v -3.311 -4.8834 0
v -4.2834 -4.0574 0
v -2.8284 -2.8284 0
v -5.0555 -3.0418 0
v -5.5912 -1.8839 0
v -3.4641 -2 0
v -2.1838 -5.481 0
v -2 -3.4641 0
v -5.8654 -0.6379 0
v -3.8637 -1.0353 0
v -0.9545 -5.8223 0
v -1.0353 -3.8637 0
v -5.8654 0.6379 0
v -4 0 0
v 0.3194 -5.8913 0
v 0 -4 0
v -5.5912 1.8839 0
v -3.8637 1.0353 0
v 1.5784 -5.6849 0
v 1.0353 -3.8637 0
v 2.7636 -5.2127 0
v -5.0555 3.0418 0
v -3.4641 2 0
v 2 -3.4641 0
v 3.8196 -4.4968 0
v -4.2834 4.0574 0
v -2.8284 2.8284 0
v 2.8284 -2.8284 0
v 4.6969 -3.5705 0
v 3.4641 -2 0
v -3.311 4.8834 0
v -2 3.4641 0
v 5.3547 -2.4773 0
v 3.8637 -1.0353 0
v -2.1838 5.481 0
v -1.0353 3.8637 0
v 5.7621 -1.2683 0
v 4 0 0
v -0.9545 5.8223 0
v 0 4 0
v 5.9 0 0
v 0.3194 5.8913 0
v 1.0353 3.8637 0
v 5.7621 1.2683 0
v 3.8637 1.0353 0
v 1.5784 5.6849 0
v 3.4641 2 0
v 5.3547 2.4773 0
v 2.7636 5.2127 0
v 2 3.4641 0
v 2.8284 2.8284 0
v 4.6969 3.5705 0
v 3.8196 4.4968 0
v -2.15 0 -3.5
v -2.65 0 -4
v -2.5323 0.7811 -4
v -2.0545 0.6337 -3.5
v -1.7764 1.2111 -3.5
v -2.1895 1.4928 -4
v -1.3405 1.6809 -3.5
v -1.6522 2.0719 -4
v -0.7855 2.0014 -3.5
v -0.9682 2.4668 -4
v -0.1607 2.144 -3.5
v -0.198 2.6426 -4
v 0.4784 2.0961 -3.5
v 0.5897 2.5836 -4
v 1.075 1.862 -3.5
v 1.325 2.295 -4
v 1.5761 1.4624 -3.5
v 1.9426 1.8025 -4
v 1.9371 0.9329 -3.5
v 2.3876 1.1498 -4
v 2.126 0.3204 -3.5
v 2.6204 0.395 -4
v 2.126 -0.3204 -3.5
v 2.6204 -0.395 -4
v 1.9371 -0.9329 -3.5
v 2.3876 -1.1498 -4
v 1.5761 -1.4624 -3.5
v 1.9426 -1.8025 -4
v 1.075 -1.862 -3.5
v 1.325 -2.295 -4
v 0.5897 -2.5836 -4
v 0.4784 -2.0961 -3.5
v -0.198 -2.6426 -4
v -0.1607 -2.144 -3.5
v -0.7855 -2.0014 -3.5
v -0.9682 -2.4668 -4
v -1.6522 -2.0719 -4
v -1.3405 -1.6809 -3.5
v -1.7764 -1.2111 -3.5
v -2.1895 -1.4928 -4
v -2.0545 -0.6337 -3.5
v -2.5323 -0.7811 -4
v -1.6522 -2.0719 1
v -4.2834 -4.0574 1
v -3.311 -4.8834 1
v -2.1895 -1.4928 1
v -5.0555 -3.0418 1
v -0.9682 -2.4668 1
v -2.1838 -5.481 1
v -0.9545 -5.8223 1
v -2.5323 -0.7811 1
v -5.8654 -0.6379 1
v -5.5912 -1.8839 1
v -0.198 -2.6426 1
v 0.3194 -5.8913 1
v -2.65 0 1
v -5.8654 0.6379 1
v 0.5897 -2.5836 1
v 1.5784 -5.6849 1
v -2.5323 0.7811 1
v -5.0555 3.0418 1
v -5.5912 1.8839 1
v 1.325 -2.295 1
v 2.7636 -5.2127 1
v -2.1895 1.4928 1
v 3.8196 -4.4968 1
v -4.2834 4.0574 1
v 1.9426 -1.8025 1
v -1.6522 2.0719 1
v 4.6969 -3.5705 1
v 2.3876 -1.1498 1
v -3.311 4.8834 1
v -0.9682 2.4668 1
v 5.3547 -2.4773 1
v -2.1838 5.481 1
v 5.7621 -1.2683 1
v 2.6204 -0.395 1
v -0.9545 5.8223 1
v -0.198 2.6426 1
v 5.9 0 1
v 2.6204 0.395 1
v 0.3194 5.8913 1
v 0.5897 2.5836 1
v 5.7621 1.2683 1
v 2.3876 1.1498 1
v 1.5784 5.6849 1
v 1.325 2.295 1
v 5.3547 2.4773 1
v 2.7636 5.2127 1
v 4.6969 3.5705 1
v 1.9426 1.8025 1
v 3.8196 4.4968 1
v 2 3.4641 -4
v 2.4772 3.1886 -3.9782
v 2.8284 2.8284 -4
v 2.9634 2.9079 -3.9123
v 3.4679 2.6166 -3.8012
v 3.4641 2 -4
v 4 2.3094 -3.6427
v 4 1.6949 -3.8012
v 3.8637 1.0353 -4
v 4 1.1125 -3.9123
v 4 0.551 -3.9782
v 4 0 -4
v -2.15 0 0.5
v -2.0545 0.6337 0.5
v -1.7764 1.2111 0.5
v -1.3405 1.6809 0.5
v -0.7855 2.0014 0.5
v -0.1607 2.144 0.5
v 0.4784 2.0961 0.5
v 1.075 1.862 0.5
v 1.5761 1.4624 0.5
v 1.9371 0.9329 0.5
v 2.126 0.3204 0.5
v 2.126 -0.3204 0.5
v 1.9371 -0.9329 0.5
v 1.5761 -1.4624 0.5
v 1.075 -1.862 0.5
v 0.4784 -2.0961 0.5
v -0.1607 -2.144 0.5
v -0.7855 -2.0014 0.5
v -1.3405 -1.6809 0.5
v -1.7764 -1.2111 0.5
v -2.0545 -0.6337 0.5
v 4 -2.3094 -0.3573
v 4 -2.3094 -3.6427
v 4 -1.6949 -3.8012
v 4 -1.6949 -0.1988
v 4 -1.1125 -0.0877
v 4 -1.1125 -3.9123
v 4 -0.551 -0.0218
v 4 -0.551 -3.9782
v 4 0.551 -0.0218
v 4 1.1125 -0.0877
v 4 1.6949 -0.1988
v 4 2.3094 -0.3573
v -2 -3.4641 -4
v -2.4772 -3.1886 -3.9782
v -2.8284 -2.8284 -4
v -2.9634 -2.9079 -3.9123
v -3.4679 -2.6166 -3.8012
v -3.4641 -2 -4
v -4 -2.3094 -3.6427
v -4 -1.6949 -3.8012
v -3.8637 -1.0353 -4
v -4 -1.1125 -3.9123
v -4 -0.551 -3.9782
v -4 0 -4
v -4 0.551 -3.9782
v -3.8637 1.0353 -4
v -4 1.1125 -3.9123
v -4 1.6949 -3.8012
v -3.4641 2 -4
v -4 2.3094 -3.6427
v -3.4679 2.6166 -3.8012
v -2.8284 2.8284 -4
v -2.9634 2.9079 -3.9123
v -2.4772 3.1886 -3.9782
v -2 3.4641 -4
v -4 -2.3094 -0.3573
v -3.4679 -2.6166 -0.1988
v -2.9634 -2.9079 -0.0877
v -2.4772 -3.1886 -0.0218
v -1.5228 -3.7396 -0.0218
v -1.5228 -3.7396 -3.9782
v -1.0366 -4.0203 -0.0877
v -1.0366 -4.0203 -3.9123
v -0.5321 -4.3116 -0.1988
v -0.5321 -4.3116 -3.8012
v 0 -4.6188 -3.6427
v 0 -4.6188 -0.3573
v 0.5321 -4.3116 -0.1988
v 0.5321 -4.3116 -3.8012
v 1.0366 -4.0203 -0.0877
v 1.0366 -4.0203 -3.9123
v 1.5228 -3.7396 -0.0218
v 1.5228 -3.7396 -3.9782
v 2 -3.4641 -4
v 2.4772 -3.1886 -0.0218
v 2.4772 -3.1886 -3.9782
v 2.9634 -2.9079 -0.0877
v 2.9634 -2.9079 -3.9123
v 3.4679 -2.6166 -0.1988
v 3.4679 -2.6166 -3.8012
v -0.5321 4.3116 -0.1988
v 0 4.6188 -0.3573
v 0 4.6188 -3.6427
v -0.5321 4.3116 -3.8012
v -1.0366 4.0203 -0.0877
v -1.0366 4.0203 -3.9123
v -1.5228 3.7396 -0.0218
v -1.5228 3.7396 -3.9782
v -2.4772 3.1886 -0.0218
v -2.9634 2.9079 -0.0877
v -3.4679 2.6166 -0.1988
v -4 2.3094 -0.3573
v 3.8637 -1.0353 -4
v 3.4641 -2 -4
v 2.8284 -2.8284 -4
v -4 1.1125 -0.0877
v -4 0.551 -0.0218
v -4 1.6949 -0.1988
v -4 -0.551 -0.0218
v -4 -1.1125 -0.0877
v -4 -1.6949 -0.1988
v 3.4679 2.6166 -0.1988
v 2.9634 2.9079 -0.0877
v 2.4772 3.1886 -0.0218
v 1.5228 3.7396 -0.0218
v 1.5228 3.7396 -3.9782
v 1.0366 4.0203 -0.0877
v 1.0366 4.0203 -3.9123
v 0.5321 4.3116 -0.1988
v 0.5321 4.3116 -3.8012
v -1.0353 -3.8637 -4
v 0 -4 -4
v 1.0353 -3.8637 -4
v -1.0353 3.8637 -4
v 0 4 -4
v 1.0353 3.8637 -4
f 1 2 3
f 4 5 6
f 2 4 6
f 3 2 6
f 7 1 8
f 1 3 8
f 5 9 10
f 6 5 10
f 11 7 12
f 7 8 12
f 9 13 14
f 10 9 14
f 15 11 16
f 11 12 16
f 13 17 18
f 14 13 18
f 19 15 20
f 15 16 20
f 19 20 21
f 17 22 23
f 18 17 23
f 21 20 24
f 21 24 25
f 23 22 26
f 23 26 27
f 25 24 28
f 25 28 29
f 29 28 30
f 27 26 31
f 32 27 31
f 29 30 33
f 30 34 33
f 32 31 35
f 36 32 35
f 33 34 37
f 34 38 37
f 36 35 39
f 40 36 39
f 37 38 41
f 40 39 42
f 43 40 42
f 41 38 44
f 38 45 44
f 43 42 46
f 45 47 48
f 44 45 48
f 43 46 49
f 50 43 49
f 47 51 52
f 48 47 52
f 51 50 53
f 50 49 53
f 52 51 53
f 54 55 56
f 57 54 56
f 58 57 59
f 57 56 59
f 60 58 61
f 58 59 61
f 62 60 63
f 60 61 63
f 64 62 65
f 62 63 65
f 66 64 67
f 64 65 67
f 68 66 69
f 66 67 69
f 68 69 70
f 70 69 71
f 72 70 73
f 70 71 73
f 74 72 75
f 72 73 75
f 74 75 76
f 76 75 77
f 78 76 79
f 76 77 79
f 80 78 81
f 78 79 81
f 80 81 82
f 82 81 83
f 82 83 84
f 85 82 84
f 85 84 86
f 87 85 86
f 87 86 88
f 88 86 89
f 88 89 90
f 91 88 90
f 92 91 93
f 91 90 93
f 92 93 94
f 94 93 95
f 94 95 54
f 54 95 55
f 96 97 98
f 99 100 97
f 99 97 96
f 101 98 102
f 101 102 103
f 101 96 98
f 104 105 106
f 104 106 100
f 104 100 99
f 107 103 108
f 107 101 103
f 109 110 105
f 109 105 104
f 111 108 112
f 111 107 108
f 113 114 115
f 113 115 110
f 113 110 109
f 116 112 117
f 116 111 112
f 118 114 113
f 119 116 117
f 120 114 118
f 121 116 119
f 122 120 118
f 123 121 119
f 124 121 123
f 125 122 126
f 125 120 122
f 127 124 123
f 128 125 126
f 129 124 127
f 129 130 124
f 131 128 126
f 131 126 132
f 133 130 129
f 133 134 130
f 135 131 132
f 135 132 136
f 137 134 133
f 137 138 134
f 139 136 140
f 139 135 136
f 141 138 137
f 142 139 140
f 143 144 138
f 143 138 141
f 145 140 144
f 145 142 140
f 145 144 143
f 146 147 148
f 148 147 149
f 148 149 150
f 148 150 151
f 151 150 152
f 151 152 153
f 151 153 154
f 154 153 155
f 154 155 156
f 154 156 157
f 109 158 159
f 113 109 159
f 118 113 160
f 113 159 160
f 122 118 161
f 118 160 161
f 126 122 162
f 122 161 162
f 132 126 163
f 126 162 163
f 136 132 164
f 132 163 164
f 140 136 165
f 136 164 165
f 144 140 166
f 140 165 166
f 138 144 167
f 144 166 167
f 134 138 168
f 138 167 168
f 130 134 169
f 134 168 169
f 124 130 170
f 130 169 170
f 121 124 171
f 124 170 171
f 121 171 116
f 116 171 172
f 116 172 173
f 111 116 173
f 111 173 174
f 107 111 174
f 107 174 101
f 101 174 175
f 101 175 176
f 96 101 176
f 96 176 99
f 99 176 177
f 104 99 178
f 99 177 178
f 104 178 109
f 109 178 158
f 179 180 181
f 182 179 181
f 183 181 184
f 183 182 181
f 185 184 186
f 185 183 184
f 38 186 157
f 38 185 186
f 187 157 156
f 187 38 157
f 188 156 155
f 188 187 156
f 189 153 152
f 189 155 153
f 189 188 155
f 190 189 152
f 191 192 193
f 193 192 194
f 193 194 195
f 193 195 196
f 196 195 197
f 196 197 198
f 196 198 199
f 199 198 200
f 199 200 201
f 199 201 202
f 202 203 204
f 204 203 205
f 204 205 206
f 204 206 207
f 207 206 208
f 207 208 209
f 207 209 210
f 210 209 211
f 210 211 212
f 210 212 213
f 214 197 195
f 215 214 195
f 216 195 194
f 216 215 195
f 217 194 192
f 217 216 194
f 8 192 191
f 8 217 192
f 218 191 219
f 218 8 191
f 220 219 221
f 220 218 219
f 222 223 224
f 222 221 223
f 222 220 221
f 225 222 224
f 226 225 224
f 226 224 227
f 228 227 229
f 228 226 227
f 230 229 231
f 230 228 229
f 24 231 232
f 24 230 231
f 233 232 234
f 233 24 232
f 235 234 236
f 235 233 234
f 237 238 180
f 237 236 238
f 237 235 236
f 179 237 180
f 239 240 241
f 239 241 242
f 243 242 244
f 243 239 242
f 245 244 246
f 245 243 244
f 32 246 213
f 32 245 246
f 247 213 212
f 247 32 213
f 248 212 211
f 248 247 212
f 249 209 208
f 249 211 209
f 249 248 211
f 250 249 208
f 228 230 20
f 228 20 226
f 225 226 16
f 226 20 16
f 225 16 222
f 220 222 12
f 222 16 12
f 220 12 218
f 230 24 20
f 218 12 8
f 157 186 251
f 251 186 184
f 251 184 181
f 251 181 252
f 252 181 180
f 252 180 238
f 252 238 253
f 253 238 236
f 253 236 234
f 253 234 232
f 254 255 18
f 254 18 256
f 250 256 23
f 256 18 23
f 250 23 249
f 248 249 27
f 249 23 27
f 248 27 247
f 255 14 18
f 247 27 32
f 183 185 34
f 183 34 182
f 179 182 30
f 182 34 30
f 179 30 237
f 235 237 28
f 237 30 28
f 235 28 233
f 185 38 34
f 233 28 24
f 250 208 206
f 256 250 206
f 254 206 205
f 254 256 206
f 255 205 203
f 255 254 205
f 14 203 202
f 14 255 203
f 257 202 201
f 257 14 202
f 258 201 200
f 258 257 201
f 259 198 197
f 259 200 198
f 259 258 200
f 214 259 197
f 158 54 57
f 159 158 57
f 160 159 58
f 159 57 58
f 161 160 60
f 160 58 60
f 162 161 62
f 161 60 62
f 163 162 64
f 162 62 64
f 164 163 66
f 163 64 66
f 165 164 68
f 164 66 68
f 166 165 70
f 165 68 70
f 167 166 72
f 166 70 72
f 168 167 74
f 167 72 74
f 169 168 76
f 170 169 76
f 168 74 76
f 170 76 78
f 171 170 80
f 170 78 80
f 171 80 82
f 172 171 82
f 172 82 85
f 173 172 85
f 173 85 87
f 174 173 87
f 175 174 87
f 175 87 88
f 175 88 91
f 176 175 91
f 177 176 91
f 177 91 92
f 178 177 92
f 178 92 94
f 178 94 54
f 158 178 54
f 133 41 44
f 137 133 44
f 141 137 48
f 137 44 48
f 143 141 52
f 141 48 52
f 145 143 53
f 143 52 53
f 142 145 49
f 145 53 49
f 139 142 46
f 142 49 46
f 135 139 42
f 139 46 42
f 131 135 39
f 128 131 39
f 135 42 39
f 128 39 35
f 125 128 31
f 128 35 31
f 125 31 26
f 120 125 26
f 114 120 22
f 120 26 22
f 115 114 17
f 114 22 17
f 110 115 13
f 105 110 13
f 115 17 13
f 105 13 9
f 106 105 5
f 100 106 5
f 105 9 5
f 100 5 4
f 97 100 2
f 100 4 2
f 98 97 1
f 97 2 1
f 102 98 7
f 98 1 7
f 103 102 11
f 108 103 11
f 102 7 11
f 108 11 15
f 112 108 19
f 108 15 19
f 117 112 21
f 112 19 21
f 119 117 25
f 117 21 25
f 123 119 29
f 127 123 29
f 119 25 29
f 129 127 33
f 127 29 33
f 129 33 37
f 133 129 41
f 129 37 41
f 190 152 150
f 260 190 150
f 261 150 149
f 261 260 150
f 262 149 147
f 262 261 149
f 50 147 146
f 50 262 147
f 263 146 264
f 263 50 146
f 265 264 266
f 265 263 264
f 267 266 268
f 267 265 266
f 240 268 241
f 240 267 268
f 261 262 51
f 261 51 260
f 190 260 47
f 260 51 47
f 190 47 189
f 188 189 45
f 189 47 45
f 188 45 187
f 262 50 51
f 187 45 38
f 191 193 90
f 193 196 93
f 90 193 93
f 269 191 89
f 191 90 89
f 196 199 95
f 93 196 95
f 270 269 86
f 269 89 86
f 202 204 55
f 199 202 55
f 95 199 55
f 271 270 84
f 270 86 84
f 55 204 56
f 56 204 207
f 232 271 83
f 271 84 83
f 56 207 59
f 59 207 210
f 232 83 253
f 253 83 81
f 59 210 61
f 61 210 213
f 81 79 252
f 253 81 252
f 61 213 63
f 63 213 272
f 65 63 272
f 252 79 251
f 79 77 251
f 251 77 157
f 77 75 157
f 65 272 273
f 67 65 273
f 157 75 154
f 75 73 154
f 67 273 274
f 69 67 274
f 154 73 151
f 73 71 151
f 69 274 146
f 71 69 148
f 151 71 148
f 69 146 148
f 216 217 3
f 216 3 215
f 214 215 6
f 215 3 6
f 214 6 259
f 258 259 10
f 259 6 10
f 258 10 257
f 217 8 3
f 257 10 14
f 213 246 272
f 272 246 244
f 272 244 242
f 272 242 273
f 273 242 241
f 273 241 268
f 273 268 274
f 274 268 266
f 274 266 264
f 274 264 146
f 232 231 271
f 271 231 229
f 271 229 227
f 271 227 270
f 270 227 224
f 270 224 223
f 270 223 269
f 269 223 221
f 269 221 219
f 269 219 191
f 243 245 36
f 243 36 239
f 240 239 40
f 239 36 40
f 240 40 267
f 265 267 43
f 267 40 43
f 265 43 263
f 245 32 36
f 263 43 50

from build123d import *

# Parameters (mm, degrees)
EXTRUDE_1_DEPTH     = 4
SKETCH_3_R          = 5.9
EXTRUDE_2_DEPTH     = 1
SKETCH_4_R          = 2.15
CUT_EXTRUDE_1_DEPTH = 10.727281223
CHAMFER_1_SIZE      = 0.5


with BuildPart() as part:
    # Sketch 1 → Extrude 1 (new body)
    with BuildSketch(Plane.XY):
        Polygon((0, 4.618802154), (-4, 2.309401077), (-4, -2.309401077), (0, -4.618802154), (4, -2.309401077), (4, 2.309401077), align=None)
    extrude(amount=-EXTRUDE_1_DEPTH)

    # Sketch 2 → Cut-Revolve 1 (revolve, cut)
    with BuildSketch(Plane(origin=(0, 0, 0), x_dir=(0, 0, -1), z_dir=(1, 0, 0))):
        Polygon((0, 4.618802154), (0.35726559, 4.618802154), (0, 4), align=None)
        Polygon((4, 4), (3.64273441, 4.618802154), (4, 4.618802154), align=None)
    revolve(axis=Axis((0, 0, 0), (0, 0, -1)), mode=Mode.SUBTRACT)

    # Sketch 3 → Extrude 2 (add)
    with BuildSketch(Plane.XY):
        Circle(SKETCH_3_R)
    extrude(amount=EXTRUDE_2_DEPTH)

    # Sketch 4 → Cut-Extrude 1 (cut, through all)
    with BuildSketch(Plane(origin=(0, 0, -4), x_dir=(-1, 0, 0), z_dir=(0, 0, -1))):
        Circle(SKETCH_4_R)
    extrude(amount=-CUT_EXTRUDE_1_DEPTH, mode=Mode.SUBTRACT)

    # Chamfer 1
    chamfer_1_edges = [part.edges().sort_by_distance(p)[0] for p in [
        (2.15, 0, 1),
        (2.15, 0, -4),
    ]]
    chamfer(chamfer_1_edges, length=CHAMFER_1_SIZE)


solid = part.part
